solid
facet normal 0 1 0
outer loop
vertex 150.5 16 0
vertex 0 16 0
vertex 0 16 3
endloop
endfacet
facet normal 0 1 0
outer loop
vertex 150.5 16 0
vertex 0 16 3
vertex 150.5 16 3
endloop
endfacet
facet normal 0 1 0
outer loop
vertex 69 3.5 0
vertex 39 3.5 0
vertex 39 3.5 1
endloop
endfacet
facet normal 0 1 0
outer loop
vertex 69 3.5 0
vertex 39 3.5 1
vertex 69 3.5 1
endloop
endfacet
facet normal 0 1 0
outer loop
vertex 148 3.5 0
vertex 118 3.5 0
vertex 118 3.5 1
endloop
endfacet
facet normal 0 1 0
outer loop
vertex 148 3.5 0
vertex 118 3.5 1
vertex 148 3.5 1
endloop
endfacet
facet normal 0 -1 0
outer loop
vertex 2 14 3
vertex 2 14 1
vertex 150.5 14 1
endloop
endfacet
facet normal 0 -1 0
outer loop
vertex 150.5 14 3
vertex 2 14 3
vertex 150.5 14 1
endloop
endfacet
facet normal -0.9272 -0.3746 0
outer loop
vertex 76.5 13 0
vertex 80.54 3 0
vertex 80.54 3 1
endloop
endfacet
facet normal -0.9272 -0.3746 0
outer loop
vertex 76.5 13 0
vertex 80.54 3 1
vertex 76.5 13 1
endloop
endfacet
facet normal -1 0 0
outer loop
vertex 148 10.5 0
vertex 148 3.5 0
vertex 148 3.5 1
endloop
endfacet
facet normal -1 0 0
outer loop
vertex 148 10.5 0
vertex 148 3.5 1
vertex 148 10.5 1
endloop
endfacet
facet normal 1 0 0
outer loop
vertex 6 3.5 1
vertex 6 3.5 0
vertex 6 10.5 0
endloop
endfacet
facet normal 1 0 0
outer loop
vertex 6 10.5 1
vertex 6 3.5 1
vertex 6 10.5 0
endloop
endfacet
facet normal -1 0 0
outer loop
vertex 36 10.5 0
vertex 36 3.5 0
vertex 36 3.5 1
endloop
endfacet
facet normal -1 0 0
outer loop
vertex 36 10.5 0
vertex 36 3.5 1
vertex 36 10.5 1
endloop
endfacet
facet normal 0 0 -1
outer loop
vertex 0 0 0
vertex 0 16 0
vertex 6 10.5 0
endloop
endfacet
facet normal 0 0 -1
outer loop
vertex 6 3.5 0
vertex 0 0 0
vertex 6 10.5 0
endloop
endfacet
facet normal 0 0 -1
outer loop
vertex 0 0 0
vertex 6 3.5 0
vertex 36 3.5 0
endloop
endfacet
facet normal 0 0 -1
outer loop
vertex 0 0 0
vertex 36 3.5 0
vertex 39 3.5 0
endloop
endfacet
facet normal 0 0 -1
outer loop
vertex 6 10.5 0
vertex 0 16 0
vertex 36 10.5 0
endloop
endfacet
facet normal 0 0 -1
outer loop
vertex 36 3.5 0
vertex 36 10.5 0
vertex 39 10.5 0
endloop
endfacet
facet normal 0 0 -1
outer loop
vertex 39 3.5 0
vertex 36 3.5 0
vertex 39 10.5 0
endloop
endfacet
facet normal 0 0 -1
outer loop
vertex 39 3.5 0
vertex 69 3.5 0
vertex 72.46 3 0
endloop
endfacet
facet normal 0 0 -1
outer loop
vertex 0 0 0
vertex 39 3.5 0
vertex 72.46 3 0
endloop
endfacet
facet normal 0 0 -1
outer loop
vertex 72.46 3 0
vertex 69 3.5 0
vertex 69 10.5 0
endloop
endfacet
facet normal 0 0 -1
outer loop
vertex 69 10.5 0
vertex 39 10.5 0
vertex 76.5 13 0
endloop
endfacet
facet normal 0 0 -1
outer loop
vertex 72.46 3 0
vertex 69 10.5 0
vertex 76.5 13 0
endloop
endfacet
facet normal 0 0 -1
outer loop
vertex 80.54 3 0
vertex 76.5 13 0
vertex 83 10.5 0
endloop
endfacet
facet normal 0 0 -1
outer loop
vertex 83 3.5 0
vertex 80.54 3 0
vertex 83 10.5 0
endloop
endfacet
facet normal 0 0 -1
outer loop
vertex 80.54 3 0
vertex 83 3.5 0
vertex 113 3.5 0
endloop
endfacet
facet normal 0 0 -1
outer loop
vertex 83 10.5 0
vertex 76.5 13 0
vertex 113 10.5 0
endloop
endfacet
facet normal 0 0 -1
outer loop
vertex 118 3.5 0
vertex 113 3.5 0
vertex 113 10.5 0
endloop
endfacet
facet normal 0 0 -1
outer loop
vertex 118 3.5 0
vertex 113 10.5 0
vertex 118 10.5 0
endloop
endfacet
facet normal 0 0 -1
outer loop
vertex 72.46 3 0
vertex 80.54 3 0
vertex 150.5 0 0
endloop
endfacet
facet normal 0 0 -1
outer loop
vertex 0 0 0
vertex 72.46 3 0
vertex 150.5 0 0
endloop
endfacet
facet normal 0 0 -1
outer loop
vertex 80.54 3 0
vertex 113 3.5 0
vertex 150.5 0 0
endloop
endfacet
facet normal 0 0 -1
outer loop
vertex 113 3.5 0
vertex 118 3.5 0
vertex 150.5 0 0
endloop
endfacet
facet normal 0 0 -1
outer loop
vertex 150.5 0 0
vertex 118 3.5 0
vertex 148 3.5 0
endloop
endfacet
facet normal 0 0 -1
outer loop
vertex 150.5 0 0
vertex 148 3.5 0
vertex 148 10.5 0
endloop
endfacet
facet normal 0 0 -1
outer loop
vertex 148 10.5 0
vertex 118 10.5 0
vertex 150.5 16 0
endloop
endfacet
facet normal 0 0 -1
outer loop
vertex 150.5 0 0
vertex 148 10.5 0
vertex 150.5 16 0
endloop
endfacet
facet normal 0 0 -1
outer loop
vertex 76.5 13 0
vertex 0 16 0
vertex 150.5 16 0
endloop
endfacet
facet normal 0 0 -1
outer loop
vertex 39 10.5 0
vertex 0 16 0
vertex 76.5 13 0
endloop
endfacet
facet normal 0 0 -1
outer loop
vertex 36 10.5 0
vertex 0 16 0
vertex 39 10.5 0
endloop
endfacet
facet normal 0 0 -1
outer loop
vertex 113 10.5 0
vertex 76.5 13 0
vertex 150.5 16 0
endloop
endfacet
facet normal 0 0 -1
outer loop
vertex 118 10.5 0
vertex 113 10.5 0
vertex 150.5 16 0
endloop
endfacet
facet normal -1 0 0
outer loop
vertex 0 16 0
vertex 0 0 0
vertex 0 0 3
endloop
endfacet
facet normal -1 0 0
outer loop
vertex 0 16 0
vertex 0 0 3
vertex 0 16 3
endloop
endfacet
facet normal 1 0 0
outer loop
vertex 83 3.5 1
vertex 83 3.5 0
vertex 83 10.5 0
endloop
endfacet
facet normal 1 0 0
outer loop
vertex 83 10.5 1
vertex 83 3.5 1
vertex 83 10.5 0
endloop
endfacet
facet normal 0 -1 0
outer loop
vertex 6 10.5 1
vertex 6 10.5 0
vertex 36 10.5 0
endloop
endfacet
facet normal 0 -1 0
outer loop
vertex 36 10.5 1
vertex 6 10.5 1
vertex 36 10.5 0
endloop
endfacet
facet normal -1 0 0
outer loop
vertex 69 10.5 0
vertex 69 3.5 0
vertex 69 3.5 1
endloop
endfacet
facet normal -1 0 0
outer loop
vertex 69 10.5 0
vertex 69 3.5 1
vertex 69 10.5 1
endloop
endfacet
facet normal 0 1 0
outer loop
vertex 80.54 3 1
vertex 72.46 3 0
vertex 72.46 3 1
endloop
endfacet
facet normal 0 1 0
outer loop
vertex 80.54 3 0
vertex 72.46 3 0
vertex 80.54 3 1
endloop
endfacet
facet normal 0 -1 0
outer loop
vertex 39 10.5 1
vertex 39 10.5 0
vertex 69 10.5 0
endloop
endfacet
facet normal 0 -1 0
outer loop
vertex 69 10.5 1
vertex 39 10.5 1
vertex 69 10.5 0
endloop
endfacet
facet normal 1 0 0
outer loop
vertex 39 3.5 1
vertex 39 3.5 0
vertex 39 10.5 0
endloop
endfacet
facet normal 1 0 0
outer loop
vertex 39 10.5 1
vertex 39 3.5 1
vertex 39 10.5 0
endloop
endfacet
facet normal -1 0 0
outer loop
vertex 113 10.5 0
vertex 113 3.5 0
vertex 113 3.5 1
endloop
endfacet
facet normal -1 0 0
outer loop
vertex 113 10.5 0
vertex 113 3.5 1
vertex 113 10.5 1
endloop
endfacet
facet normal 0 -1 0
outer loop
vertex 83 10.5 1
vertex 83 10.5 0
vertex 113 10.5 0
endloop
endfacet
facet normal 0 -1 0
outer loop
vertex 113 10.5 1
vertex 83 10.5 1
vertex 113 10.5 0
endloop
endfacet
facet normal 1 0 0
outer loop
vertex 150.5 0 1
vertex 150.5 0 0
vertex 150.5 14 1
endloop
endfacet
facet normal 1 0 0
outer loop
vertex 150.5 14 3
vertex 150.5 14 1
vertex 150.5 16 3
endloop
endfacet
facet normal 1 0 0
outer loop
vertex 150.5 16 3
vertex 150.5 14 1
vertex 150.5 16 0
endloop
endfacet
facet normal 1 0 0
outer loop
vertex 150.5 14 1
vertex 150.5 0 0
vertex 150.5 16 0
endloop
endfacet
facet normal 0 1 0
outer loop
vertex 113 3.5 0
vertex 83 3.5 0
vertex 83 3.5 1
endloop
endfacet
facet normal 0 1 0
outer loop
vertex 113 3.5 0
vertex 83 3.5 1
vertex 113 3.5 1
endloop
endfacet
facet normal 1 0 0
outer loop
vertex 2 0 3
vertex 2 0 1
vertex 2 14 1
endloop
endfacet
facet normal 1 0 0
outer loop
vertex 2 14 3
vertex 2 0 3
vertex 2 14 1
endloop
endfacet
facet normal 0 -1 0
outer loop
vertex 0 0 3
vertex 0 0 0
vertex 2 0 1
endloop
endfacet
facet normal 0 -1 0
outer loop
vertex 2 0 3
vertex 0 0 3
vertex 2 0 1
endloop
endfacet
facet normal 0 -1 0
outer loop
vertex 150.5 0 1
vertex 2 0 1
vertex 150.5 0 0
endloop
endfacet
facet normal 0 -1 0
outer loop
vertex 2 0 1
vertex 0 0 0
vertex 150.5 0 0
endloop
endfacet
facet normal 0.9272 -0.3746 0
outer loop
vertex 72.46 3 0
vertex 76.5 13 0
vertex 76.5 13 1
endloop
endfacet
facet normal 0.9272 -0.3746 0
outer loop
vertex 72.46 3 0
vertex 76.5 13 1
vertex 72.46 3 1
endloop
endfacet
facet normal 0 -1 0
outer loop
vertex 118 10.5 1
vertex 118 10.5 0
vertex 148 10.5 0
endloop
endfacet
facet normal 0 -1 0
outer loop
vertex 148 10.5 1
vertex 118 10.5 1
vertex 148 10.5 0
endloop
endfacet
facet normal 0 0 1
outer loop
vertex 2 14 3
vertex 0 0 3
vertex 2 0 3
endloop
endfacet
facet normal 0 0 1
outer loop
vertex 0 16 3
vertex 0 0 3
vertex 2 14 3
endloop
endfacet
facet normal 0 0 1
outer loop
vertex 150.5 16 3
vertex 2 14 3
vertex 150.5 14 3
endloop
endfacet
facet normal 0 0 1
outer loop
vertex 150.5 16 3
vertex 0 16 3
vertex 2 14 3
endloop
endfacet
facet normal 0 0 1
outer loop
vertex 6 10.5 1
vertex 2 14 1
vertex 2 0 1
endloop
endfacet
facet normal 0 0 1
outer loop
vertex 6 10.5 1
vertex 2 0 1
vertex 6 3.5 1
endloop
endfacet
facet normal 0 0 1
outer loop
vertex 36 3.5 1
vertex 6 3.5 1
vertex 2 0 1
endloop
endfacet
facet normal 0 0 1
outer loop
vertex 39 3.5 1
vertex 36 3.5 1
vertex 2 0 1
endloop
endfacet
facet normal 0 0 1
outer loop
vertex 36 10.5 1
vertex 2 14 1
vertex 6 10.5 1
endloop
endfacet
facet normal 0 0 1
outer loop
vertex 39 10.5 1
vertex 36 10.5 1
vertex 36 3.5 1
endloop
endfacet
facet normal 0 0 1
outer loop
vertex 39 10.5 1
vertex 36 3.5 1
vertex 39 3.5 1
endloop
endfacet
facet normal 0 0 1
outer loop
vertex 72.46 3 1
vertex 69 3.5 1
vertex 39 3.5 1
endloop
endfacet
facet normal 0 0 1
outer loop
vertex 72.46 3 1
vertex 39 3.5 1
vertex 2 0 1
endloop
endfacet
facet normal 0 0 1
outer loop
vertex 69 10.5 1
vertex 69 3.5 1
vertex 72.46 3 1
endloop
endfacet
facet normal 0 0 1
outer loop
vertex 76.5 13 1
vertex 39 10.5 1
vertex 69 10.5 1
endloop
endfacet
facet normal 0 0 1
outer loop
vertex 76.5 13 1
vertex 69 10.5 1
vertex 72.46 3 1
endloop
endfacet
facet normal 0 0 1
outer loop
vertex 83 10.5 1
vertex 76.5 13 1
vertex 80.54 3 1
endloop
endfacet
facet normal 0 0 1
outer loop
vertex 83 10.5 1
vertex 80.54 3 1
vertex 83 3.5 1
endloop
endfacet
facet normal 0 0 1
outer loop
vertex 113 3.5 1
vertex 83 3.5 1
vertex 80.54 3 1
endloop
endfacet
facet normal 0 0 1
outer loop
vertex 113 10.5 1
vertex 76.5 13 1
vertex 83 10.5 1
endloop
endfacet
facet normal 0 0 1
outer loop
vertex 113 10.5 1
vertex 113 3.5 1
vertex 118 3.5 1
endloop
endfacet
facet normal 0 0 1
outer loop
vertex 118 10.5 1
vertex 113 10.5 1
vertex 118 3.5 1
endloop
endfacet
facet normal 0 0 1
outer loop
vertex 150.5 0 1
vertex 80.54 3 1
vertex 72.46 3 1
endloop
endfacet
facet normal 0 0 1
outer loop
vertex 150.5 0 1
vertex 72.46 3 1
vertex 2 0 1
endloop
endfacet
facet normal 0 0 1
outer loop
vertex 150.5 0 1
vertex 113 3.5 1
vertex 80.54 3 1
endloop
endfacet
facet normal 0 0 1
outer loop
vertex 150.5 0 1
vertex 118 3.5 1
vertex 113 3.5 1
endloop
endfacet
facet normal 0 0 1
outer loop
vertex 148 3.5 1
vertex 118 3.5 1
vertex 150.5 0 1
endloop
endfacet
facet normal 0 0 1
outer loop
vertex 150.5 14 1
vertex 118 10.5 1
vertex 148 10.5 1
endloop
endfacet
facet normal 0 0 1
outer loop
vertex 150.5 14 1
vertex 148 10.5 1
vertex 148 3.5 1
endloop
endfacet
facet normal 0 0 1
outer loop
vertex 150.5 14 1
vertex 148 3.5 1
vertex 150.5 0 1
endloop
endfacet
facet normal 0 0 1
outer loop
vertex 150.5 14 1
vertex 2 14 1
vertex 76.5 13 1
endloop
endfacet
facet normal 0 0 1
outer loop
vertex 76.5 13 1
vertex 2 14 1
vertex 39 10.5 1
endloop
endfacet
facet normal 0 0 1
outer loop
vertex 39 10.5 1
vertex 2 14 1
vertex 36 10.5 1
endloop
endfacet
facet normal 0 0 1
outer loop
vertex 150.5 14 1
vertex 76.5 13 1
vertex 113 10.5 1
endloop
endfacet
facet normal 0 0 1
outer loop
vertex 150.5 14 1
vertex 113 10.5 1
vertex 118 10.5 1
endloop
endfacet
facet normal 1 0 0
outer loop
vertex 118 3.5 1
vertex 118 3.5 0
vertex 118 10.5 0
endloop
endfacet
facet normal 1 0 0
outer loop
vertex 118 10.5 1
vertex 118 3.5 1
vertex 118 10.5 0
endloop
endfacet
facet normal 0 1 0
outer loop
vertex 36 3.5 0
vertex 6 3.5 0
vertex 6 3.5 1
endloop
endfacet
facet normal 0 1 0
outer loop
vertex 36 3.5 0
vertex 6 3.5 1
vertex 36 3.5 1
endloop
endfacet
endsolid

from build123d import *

# Parameters (mm, degrees)
BOX020_W      = 30
BOX020_H      = 7
BOX020_DEPTH  = 10
BOX027_W      = 30
BOX027_H      = 7
BOX027_DEPTH  = 10
BOX028_W      = 30
BOX028_H      = 7
BOX028_DEPTH  = 10
BOX026_W      = 30
BOX026_H      = 7
BOX026_DEPTH  = 10
EXTRUDE_DEPTH = 4
BOX019_W      = 148.5
BOX019_H      = 14
BOX019_DEPTH  = 2
BOX014_W      = 150.5
BOX014_H      = 16
BOX014_DEPTH  = 3


with BuildPart() as cube020:
    # Box020 → Box020 (new body)
    with BuildSketch(Plane(origin=(6, 3.5, -3), x_dir=(1, 0, 0), z_dir=(0, 0, 1))):
        with Locations((15, 3.5)):
            Rectangle(BOX020_W, BOX020_H)
    extrude(amount=BOX020_DEPTH)


with BuildPart() as cube027:
    # Box027 → Box027 (new body)
    with BuildSketch(Plane(origin=(83, 3.5, -3), x_dir=(1, 0, 0), z_dir=(0, 0, 1))):
        with Locations((15, 3.5)):
            Rectangle(BOX027_W, BOX027_H)
    extrude(amount=BOX027_DEPTH)


with BuildPart() as cube028:
    # Box028 → Box028 (new body)
    with BuildSketch(Plane(origin=(118, 3.5, -3), x_dir=(1, 0, 0), z_dir=(0, 0, 1))):
        with Locations((15, 3.5)):
            Rectangle(BOX028_W, BOX028_H)
    extrude(amount=BOX028_DEPTH)


with BuildPart() as cube026:
    # Box026 → Box026 (new body)
    with BuildSketch(Plane(origin=(39, 3.5, -3), x_dir=(1, 0, 0), z_dir=(0, 0, 1))):
        with Locations((15, 3.5)):
            Rectangle(BOX026_W, BOX026_H)
    extrude(amount=BOX026_DEPTH)


with BuildPart() as extrude_body:
    # Sketch (on Face7 of Cut009) → Extrude (new body)
    with BuildSketch(Plane.XY.offset(1)):
        Polygon((76.5, 12), (72.459738, 2), (80.540262, 2), align=None)
    extrude(amount=EXTRUDE_DEPTH)


with BuildPart() as extrude_body_1:
    # Extrude placement: moved
    add(extrude_body.part.moved(Location((0, 1, -2.3))))


with BuildPart() as cube019:
    # Box019 → Box019 (new body)
    with BuildSketch(Plane(origin=(2, 0, 1), x_dir=(1, 0, 0), z_dir=(0, 0, 1))):
        with Locations((74.25, 7)):
            Rectangle(BOX019_W, BOX019_H)
    extrude(amount=BOX019_DEPTH)


with BuildPart() as marcador_cortes:
    # Box014 → Box014 (new body)
    with BuildSketch(Plane.XY):
        with Locations((75.25, 8)):
            Rectangle(BOX014_W, BOX014_H)
    extrude(amount=BOX014_DEPTH)

    # Cut009: cut Cube019
    add(cube019.part, mode=Mode.SUBTRACT)

    # Cut010: cut Extrude body
    add(extrude_body_1.part, mode=Mode.SUBTRACT)

    # Cut011: cut Cube026
    add(cube026.part, mode=Mode.SUBTRACT)

    # Cut012: cut Cube028
    add(cube028.part, mode=Mode.SUBTRACT)

    # Cut013: cut Cube027
    add(cube027.part, mode=Mode.SUBTRACT)

    # Cut014: cut Cube020
    add(cube020.part, mode=Mode.SUBTRACT)


solid = marcador_cortes.part
